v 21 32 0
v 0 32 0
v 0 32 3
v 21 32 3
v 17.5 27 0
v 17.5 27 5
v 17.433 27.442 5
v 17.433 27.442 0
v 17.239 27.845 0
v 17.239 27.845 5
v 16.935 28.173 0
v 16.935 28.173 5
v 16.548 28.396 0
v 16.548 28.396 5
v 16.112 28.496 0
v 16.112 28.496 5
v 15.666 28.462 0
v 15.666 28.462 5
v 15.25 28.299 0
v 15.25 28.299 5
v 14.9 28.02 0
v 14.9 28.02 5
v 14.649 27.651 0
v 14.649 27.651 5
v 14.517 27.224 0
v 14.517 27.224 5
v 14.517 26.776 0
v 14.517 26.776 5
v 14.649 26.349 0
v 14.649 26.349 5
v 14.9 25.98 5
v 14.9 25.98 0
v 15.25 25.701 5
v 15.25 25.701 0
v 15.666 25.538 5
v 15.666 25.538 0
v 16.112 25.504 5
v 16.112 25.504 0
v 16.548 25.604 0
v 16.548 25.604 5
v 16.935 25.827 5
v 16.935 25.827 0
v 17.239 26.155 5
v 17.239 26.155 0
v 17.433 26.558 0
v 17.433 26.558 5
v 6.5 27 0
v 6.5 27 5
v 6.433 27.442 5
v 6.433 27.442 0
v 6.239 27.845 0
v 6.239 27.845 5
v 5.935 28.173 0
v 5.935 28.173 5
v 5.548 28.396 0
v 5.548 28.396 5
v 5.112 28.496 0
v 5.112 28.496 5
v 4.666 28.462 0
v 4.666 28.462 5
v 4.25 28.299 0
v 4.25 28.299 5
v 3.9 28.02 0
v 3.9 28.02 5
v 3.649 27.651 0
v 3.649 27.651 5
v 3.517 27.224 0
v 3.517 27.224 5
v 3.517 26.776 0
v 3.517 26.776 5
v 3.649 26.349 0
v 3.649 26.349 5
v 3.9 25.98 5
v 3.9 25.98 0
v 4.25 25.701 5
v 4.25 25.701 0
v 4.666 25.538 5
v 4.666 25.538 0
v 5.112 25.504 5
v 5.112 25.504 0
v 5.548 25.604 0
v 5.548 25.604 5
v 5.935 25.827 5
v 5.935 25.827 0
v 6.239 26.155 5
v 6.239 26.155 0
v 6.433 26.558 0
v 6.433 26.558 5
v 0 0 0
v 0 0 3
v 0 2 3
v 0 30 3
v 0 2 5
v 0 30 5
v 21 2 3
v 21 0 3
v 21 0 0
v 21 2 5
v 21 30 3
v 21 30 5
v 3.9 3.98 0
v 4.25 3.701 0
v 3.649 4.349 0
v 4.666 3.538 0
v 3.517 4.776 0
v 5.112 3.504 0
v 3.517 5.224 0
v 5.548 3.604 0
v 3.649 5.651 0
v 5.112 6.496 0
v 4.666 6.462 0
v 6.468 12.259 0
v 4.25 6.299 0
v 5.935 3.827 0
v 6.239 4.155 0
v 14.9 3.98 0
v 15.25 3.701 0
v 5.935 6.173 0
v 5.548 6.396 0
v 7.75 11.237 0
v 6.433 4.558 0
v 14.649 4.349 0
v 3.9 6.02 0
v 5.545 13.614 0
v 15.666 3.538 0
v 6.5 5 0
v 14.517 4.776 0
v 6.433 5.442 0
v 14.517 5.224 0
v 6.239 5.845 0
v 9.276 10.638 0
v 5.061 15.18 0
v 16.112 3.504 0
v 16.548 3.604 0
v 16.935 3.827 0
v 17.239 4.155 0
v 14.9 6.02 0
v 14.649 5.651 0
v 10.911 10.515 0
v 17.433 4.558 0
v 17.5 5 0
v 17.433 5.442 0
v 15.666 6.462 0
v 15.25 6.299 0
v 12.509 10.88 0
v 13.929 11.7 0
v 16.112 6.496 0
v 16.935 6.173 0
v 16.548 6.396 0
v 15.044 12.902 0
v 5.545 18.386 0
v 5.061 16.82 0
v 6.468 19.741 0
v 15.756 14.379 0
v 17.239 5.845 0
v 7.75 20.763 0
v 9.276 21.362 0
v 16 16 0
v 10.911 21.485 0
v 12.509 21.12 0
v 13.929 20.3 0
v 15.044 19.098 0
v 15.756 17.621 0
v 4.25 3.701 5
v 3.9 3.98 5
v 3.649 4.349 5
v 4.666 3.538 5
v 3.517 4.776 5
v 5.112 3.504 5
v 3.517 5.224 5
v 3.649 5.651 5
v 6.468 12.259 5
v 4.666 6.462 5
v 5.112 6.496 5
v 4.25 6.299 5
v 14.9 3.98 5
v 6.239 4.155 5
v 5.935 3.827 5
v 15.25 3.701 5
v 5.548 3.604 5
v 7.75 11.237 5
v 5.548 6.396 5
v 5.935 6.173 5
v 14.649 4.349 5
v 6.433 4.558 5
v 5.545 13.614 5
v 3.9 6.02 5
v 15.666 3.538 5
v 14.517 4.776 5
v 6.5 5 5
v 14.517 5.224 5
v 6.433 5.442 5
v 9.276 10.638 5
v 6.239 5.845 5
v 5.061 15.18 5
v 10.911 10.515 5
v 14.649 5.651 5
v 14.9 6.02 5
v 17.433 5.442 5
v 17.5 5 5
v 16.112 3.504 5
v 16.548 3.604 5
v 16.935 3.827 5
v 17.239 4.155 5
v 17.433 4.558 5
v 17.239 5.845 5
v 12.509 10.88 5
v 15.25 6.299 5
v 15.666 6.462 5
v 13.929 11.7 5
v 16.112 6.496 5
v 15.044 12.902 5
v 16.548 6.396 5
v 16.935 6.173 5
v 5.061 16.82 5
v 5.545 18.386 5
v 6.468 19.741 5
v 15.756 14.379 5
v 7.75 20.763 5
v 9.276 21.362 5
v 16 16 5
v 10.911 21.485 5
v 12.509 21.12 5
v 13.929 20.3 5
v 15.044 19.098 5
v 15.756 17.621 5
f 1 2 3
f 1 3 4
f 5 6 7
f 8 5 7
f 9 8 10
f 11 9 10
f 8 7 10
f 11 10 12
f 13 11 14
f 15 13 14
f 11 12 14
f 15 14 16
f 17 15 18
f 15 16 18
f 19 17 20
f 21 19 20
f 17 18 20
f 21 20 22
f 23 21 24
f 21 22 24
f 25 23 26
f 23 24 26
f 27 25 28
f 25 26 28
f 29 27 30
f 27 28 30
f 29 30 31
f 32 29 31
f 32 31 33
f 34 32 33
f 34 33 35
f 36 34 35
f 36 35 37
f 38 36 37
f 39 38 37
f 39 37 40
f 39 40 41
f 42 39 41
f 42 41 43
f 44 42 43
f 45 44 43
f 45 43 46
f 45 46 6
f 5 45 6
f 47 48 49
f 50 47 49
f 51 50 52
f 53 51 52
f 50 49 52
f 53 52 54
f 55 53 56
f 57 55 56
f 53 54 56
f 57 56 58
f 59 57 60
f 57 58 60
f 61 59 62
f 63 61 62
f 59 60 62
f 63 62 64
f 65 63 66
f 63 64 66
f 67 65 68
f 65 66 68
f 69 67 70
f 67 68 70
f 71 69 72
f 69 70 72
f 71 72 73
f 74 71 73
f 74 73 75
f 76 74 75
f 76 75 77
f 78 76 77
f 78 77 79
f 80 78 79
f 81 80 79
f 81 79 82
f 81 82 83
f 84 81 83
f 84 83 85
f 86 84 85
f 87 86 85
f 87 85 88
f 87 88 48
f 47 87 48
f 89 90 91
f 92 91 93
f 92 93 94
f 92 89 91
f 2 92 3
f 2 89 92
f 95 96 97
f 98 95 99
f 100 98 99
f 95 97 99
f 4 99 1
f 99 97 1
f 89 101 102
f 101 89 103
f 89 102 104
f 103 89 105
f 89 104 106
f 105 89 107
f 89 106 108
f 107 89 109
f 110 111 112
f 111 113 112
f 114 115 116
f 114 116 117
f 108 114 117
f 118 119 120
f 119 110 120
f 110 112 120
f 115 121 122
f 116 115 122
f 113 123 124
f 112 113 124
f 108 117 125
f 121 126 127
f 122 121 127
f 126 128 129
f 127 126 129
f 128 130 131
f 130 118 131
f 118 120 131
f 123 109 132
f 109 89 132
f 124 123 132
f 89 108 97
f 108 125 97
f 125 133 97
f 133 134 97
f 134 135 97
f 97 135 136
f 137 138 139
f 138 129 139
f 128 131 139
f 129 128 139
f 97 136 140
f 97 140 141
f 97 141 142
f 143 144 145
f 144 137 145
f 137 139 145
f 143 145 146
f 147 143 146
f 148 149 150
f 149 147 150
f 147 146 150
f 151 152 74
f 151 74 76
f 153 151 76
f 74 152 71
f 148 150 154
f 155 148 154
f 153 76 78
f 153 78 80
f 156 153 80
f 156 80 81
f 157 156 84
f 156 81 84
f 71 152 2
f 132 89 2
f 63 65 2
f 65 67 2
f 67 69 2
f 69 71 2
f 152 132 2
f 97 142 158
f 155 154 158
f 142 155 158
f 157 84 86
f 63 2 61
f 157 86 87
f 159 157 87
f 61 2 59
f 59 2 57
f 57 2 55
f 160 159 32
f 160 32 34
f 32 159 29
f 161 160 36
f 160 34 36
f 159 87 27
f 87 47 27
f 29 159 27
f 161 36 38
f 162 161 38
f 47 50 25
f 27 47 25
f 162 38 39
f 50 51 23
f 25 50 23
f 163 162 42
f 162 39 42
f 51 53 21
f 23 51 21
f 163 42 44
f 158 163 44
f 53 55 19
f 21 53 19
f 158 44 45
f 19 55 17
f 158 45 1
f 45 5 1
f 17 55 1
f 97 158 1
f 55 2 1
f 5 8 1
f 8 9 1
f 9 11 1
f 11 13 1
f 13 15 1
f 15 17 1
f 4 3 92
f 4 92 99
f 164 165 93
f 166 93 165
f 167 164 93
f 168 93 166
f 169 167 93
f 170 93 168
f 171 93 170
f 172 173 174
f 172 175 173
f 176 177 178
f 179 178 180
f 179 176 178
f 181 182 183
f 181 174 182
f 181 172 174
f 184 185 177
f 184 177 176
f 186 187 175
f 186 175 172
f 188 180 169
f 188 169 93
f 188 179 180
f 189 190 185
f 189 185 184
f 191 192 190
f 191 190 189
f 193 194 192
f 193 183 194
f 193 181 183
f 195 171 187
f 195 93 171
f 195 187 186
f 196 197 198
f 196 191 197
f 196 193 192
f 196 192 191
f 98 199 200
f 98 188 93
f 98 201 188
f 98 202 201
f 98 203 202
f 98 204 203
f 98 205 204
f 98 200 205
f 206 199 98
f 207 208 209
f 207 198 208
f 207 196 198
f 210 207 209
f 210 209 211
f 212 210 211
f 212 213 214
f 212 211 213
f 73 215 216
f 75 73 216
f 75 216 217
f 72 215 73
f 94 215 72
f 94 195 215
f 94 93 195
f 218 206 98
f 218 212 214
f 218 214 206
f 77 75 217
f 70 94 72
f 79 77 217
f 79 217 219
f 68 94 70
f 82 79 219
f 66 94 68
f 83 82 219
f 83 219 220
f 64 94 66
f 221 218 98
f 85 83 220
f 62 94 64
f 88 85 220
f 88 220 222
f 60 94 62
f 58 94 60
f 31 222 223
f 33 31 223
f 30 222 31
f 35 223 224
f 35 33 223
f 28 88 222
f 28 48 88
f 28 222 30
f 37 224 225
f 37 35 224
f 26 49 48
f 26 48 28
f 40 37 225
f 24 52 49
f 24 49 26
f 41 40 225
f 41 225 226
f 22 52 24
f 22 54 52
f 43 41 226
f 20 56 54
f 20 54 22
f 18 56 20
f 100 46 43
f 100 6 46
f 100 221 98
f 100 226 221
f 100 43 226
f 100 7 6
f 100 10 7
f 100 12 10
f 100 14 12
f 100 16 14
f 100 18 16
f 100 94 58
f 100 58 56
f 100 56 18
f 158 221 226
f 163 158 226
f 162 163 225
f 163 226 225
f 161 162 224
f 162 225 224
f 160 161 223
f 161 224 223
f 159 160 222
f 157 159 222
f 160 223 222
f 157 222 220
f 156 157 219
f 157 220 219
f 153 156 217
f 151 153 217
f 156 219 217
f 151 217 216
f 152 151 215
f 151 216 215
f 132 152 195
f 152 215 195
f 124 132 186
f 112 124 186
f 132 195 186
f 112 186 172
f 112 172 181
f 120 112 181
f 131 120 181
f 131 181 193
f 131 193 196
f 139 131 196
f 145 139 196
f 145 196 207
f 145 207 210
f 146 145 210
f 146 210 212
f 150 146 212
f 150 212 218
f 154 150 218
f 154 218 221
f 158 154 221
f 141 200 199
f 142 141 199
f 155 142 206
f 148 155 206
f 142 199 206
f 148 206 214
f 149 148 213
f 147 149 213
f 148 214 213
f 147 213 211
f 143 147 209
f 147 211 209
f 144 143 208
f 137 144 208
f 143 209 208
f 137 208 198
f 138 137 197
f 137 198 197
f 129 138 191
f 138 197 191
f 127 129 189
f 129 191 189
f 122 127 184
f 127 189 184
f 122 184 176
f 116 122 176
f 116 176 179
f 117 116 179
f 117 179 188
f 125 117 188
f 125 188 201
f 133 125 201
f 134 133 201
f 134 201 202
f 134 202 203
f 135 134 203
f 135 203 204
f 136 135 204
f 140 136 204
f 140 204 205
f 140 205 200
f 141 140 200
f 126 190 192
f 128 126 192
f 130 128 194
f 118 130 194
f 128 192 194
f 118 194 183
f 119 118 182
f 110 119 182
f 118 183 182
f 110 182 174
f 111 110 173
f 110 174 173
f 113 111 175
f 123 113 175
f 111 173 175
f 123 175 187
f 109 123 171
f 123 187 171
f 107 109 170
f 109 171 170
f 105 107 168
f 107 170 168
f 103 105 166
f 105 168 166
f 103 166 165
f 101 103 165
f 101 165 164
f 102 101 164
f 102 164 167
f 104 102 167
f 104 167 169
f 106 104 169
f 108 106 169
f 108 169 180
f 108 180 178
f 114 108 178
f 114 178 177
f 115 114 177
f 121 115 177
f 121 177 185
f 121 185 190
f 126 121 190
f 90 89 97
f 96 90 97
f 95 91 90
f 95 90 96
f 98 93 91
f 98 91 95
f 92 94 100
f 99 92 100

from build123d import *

# Parameters (mm, degrees)
BOX_W           = 21
BOX_H           = 32
BOX_DEPTH       = 5
SKETCH_R        = 5.5
POCKET_DEPTH    = 5.001
SKETCH001_R     = 1.5
POCKET001_DEPTH = 5.001
SKETCH002_W     = 21
SKETCH002_H     = 2
POCKET002_DEPTH = 2


with BuildPart() as part:
    # Box → Box (new body)
    with BuildSketch(Plane.XY):
        with Locations((10.5, 16)):
            Rectangle(BOX_W, BOX_H)
    extrude(amount=BOX_DEPTH)

    # Sketch → Pocket (cut, through all)
    with BuildSketch(Plane.XY.offset(5)):
        with Locations((10.5, 16)):
            Circle(SKETCH_R)
    extrude(amount=-POCKET_DEPTH, mode=Mode.SUBTRACT)

    # Sketch001 → Pocket001 (cut, through all)
    with BuildSketch(Plane.XY.offset(5)):
        with Locations((5, 27)):
            Circle(SKETCH001_R)
        with Locations((16, 27)):
            Circle(SKETCH001_R)
        with Locations((5, 5)):
            Circle(SKETCH001_R)
        with Locations((16, 5)):
            Circle(SKETCH001_R)
    extrude(amount=-POCKET001_DEPTH, mode=Mode.SUBTRACT)

    # Sketch002 → Pocket002 (cut)
    with BuildSketch(Plane.XY.offset(5)):
        with Locations((10.5, 1)):
            Rectangle(SKETCH002_W, SKETCH002_H)
        with Locations((10.5, 31)):
            Rectangle(SKETCH002_W, SKETCH002_H)
    extrude(amount=-POCKET002_DEPTH, mode=Mode.SUBTRACT)


solid = part.part
